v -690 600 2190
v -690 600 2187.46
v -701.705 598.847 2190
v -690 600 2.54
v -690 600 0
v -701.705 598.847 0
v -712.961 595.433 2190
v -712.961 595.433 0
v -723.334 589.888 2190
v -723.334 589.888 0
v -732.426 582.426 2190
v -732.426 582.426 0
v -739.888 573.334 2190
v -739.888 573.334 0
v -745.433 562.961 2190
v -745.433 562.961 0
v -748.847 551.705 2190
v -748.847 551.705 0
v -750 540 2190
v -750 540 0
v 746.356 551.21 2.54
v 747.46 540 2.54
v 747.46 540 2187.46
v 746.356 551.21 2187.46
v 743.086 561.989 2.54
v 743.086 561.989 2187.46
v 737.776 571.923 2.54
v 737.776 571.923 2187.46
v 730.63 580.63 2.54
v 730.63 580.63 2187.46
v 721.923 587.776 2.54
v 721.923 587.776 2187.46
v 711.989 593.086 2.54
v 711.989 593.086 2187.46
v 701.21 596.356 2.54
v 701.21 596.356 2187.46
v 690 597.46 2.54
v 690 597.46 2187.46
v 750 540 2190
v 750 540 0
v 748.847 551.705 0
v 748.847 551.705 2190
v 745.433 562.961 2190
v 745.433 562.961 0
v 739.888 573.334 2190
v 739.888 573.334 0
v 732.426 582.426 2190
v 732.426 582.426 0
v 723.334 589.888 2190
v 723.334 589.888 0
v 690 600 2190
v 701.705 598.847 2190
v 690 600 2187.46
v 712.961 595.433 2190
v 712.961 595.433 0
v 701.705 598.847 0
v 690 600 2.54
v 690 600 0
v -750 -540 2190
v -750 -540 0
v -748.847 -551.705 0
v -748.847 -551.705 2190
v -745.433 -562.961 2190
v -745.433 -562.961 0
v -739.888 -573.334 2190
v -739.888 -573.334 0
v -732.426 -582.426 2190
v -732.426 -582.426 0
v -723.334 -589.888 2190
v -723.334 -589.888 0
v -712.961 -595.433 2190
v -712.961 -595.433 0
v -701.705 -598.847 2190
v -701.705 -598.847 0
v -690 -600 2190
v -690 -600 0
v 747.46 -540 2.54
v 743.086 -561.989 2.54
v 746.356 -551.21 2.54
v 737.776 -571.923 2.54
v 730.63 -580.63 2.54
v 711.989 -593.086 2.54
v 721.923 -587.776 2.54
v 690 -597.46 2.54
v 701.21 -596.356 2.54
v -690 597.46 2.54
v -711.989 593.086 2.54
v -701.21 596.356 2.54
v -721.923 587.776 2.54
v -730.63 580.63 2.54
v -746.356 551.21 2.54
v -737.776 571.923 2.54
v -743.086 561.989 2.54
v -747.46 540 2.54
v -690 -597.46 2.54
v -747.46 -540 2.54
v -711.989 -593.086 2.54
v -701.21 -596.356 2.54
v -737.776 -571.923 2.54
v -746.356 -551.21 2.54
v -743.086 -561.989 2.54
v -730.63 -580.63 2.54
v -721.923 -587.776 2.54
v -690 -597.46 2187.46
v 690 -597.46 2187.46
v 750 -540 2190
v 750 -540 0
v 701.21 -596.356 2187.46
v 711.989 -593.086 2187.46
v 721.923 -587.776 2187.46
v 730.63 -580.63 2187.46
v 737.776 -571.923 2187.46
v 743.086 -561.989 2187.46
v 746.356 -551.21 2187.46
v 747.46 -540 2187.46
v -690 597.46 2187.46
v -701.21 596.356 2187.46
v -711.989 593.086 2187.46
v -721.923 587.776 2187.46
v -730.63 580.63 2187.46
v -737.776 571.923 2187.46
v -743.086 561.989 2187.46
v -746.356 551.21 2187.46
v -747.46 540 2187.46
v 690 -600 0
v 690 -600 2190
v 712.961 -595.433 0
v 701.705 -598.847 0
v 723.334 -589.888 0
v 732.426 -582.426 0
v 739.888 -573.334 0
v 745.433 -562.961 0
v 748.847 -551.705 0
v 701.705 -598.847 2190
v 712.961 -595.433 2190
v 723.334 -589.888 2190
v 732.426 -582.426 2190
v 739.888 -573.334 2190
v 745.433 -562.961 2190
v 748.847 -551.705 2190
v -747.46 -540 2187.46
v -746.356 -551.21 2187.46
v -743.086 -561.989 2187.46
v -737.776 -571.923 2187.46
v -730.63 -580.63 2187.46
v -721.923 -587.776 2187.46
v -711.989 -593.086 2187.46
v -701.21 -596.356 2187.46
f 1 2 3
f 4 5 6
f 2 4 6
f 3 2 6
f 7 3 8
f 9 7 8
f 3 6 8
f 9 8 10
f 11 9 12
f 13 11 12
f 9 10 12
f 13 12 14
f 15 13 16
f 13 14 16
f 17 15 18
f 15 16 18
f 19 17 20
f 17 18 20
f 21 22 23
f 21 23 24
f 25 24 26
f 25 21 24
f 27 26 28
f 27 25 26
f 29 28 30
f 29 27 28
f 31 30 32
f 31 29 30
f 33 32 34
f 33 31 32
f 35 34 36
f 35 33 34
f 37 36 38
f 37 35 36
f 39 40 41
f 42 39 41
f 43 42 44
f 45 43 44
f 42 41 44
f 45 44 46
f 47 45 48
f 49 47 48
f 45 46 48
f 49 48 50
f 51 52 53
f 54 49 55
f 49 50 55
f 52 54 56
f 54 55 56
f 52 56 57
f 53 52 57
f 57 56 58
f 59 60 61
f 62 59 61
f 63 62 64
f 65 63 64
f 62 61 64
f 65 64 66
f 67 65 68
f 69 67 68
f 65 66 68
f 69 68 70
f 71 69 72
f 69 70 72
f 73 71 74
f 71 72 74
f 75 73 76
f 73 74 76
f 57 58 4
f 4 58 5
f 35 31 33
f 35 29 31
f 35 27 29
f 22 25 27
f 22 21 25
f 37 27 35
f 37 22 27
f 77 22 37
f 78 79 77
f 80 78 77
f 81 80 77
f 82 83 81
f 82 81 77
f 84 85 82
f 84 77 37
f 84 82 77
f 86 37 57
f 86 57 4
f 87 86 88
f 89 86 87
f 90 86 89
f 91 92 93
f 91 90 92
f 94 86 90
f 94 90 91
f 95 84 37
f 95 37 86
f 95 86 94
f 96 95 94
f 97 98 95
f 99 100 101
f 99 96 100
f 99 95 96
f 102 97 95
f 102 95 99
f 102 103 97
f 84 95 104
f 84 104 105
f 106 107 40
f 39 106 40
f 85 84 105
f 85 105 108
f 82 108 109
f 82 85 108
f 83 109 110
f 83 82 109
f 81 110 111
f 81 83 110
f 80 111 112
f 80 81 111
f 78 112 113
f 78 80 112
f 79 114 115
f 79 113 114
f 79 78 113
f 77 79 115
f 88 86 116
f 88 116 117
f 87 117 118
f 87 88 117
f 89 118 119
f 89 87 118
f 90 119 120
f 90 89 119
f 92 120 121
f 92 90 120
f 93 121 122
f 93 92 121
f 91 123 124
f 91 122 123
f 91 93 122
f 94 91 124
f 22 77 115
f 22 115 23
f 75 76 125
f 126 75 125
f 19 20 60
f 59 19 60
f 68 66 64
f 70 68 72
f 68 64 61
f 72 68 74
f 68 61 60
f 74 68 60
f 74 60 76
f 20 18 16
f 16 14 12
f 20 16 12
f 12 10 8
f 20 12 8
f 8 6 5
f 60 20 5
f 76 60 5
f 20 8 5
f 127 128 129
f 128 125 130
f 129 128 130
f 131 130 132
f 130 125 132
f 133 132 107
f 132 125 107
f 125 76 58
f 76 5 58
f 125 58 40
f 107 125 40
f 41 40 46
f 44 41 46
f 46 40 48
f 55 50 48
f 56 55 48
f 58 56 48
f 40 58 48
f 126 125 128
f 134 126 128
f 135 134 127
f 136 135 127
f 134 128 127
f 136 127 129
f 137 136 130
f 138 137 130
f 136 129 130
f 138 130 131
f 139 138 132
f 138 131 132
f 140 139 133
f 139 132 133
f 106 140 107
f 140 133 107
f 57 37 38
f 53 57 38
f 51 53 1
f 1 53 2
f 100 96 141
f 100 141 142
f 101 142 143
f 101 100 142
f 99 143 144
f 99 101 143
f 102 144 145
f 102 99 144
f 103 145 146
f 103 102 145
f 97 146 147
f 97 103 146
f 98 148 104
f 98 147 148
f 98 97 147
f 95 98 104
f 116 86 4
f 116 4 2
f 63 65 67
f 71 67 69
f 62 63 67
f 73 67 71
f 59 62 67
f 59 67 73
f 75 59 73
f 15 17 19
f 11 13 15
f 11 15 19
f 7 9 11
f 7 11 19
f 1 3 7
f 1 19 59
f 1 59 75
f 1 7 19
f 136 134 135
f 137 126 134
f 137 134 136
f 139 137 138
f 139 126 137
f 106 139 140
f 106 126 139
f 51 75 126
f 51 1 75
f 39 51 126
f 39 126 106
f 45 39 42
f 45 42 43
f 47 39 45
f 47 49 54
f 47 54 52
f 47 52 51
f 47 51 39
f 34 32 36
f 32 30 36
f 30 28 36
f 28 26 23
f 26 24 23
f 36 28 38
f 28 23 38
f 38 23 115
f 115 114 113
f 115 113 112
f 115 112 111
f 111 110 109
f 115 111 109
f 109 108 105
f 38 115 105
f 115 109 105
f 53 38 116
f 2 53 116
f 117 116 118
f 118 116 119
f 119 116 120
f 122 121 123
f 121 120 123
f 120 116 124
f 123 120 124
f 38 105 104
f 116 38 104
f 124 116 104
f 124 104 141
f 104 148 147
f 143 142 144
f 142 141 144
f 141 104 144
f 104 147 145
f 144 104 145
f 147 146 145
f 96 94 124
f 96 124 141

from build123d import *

# Parameters (mm, degrees)
F1_DEPTH = 2190
F2_T     = -2.54


# Not quite as in the source:
# - a shell that OpenCascade refuses in one call is made with other operations: the cavity is built on its own and cut out


with BuildPart() as f1:
    # F0 (on Top) → F1 (new body)
    with BuildSketch(Plane.XY):
        with BuildLine():
            Line((690, 600), (-690, 600))
            ThreePointArc((-690, 600), (-732.4264068712, 582.4264068712), (-750, 540))
            Line((-750, 540), (-750, -540))
            ThreePointArc((-750, -540), (-732.4264068712, -582.4264068712), (-690, -600))
            Line((-690, -600), (690, -600))
            ThreePointArc((690, -600), (732.4264068712, -582.4264068712), (750, -540))
            Line((750, -540), (750, 540))
            ThreePointArc((750, 540), (732.4264068712, 582.4264068712), (690, 600))
        make_face()
    extrude(amount=F1_DEPTH)

    # F2: a shell. OpenCascade refuses it in one call, so the cavity is built on its own and cut out:
    # the body offset inwards by the wall thickness, plus a prism from it out through each open face.
    f2_core = offset(f1.part, amount=F2_T, mode=Mode.PRIVATE)
    f2_exits = [f2_core.faces().sort_by_distance(p)[0] for p in [
        (0, 597.46, 1095),
    ]]
    add(f2_core, mode=Mode.SUBTRACT)
    extrude(f2_exits, amount=-F2_T, mode=Mode.SUBTRACT)


solid = f1.part
